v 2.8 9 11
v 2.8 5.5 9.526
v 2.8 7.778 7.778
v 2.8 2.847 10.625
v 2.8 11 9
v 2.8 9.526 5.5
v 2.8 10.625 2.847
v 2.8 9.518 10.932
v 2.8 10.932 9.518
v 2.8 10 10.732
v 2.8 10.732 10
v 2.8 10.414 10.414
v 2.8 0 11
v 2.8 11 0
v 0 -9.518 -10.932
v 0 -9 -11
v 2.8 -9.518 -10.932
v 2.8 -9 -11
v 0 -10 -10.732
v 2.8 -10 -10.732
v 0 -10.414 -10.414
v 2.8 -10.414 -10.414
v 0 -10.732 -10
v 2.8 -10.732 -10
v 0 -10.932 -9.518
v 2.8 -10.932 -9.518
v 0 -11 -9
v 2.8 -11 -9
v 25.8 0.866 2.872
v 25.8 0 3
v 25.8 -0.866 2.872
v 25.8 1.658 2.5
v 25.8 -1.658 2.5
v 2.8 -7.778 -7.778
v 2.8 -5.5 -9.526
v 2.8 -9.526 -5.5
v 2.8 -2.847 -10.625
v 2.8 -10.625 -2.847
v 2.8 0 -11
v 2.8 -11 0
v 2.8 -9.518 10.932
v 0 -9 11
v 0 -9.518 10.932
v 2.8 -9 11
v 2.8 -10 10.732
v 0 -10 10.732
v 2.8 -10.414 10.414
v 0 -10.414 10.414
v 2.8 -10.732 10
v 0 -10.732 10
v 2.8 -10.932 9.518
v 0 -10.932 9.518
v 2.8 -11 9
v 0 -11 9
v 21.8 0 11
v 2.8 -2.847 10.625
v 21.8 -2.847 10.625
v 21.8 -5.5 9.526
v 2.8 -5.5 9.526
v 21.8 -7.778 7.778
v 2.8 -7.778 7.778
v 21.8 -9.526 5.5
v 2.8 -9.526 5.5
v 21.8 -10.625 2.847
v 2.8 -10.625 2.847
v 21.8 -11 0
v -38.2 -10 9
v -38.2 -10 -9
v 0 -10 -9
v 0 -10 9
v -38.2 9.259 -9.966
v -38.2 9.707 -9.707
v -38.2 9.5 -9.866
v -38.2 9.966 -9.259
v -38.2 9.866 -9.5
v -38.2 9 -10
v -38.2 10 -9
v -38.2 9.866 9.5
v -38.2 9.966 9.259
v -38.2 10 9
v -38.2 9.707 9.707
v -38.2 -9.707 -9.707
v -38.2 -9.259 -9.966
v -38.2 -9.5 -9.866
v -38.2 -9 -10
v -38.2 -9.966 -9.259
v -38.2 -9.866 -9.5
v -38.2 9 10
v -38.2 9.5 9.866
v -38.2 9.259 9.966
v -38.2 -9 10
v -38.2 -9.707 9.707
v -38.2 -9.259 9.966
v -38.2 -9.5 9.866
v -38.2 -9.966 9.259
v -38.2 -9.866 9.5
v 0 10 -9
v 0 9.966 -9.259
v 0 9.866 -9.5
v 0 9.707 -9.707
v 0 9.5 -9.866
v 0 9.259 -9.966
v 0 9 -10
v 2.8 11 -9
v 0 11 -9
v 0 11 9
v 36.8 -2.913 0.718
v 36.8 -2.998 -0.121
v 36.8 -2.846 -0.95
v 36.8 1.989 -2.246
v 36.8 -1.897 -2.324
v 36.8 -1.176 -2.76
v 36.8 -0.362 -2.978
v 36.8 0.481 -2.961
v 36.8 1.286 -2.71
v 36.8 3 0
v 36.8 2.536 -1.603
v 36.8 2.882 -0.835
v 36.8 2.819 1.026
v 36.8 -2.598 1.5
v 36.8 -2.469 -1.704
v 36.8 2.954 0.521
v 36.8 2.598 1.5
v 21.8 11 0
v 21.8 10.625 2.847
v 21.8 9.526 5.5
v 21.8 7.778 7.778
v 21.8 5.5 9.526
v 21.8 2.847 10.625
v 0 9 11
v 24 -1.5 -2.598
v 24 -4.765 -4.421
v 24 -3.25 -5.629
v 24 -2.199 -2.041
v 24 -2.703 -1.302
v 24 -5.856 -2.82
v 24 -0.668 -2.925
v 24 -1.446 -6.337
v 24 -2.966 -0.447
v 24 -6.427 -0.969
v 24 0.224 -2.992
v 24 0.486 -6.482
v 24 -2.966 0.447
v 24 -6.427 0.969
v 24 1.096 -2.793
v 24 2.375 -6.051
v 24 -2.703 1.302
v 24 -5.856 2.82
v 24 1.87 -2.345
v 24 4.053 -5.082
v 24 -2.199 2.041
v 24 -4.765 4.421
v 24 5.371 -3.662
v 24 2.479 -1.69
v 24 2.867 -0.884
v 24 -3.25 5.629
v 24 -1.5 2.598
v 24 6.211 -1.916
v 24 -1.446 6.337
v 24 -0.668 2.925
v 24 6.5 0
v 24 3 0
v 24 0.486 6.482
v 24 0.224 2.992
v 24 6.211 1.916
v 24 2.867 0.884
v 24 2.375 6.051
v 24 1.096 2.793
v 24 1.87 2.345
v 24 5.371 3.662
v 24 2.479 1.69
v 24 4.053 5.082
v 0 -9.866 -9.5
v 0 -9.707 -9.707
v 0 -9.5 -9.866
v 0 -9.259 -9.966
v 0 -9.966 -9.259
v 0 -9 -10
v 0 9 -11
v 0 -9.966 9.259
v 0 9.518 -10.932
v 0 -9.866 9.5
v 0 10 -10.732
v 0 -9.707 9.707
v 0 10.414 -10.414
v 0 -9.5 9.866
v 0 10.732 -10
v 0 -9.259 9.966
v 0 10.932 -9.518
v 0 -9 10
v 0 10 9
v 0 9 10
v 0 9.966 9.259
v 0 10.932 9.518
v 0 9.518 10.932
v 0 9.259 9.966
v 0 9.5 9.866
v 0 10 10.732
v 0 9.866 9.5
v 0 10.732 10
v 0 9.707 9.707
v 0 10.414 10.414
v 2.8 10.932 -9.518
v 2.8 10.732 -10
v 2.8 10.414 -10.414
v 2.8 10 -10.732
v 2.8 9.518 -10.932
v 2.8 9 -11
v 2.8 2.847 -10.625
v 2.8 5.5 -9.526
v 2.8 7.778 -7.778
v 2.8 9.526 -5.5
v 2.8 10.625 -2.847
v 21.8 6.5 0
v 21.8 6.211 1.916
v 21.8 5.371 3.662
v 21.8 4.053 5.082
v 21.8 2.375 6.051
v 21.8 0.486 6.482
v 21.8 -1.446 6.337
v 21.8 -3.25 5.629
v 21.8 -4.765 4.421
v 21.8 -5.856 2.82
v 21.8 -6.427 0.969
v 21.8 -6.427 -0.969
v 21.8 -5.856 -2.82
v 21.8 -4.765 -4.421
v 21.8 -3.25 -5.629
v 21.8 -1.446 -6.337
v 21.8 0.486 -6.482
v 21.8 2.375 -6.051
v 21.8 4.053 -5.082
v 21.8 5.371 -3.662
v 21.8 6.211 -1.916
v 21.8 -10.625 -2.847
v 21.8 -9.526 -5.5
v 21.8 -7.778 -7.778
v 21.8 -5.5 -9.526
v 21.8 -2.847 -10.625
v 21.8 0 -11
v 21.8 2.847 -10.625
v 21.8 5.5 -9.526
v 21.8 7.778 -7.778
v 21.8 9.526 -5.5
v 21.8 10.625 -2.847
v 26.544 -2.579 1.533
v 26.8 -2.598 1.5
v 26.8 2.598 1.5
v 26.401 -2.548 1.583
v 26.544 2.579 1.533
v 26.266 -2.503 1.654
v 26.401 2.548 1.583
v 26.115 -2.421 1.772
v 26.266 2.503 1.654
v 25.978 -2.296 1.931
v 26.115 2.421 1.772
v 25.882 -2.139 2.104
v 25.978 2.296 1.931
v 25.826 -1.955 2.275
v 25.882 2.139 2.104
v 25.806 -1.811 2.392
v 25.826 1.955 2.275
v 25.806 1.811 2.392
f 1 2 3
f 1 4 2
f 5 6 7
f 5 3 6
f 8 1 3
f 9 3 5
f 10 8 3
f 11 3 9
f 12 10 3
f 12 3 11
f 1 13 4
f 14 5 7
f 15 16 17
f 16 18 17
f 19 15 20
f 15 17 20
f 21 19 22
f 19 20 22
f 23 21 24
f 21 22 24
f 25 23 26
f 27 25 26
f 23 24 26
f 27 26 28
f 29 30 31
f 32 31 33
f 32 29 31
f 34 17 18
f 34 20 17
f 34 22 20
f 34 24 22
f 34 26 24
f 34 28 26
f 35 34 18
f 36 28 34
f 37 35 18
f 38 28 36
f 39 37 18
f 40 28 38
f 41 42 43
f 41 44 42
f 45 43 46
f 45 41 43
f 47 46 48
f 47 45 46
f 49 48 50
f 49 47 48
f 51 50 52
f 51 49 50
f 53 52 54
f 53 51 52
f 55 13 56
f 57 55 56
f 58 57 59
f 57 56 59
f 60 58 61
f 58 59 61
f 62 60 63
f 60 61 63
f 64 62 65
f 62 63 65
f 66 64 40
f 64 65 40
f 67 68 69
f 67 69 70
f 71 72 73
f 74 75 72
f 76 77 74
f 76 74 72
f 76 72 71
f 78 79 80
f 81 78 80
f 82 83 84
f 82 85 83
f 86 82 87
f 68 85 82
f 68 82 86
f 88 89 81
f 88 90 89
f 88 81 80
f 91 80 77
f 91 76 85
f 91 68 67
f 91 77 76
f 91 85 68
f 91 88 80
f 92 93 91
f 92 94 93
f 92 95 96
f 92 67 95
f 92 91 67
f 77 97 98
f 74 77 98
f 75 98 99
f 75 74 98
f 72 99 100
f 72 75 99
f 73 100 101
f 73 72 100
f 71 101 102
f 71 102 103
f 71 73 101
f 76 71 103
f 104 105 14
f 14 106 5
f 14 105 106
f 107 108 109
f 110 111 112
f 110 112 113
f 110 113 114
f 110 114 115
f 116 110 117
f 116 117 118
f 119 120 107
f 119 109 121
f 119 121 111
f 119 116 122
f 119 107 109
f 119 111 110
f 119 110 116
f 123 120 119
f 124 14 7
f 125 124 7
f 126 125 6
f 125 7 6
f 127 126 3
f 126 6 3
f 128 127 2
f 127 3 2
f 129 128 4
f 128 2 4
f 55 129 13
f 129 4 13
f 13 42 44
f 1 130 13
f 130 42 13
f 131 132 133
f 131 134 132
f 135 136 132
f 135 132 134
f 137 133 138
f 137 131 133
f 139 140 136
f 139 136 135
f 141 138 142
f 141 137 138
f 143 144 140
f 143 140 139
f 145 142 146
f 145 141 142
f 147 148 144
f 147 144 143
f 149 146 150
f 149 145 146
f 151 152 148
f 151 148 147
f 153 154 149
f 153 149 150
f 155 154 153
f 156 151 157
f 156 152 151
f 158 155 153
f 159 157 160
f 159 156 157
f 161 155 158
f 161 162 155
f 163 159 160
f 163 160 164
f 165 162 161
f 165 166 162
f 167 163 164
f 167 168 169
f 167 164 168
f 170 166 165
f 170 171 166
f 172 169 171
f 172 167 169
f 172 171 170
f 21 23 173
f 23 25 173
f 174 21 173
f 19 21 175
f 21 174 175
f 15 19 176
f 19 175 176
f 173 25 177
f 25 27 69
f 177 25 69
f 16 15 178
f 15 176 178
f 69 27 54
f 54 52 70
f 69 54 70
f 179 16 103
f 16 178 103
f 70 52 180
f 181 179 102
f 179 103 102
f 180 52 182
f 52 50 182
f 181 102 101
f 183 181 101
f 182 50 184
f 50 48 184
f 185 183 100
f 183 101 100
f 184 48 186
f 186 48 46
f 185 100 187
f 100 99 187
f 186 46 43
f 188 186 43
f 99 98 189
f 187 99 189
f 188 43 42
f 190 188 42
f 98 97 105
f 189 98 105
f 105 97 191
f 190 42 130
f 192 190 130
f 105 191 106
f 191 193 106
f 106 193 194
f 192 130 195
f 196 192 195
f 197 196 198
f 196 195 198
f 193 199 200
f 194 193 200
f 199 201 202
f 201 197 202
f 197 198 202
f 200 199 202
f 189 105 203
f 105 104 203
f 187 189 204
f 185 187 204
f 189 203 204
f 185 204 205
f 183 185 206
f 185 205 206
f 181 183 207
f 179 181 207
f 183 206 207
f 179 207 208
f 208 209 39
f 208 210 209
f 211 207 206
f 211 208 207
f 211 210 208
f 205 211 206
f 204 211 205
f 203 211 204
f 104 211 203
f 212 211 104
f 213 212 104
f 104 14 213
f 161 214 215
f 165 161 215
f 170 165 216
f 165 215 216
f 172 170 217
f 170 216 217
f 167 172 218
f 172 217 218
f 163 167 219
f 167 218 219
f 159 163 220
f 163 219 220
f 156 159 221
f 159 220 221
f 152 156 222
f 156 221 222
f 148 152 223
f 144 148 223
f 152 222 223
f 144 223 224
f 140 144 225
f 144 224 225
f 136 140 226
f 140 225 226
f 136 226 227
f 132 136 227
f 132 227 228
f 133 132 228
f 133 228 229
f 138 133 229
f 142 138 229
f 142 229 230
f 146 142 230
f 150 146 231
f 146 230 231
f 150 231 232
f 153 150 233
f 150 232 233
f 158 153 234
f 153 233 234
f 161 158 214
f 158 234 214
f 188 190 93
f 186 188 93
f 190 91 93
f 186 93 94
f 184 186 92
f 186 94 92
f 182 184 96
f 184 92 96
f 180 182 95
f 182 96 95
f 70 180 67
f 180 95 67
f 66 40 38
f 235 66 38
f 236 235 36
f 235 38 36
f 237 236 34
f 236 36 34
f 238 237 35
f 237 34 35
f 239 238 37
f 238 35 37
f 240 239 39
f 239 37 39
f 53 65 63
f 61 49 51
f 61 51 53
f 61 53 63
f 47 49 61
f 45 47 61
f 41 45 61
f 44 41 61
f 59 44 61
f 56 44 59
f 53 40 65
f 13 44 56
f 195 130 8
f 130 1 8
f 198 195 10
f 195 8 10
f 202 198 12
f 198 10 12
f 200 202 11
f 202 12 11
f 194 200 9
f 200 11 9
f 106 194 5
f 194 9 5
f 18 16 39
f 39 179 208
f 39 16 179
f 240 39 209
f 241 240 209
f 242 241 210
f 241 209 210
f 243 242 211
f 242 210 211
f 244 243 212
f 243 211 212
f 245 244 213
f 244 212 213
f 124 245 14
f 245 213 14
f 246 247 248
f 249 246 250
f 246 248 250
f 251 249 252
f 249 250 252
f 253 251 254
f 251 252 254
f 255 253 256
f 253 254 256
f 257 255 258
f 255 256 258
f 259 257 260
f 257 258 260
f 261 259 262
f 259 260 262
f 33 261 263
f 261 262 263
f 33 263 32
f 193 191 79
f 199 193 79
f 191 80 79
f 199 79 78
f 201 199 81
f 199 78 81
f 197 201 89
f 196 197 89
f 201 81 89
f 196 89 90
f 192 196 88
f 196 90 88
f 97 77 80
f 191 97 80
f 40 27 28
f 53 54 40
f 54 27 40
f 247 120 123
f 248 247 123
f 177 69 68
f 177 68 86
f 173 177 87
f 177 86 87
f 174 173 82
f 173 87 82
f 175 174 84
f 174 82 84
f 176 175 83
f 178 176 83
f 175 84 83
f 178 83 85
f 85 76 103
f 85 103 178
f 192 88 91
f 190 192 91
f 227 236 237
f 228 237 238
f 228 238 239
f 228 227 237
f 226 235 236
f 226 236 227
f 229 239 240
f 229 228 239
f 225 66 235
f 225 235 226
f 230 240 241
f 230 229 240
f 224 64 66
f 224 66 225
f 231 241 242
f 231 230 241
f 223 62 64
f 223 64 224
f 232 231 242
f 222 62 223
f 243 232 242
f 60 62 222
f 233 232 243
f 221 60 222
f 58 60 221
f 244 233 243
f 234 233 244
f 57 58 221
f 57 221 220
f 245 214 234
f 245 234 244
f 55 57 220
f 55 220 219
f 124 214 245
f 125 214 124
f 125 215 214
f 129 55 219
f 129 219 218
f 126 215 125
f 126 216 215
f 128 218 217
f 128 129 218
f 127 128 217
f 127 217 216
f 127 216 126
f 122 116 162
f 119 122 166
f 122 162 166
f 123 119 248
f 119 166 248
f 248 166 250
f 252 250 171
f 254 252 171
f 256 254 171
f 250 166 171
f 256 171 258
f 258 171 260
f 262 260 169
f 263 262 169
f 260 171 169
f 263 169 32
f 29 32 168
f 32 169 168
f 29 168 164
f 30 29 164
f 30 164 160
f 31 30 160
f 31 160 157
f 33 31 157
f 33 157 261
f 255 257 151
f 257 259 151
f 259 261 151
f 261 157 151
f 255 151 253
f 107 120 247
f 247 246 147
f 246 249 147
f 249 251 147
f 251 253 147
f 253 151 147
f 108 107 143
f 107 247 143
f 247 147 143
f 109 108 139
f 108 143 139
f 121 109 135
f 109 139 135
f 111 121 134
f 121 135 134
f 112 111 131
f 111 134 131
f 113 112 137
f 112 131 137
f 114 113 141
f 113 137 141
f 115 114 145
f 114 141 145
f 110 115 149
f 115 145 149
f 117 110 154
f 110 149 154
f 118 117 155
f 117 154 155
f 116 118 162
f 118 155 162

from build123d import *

# Parameters (mm, degrees)
F0_W      = 2.8
F0_H      = 22
F1_DEPTH  = 11
F2_R      = 2
F4_DEPTH  = 19
F5_R      = 3
F6_DEPTH  = 15
F8_DEPTH  = 11
F9_R      = 1
F10_W     = 20
F10_H     = 20
F11_DEPTH = 38.2
F12_R     = 1
F5_R_2    = 6.5
F13_DEPTH = 2.2


with BuildPart() as f1:
    # F0 (on Top) → F1 (new body, symmetric)
    with BuildSketch(Plane.XY):
        with Locations((1.4, 0)):
            Rectangle(F0_W, F0_H)
    extrude(amount=F1_DEPTH, both=True)

    # F2
    f2_edges = [f1.edges().sort_by_distance(p)[0] for p in [
        (1.4, -11, 11),
        (1.4, 11, 11),
        (1.4, -11, -11),
        (1.4, 11, -11),
    ]]
    fillet(f2_edges, radius=F2_R)

    # F3 (on face) → F4 (join)
    with BuildSketch(Plane.YZ.offset(2.8)):
        with BuildLine():
            ThreePointArc((0, -11), (7.7781745931, -7.7781745931), (11, 0))
            ThreePointArc((11, 0), (7.7781745931, 7.7781745931), (0, 11))
            ThreePointArc((0, 11), (-7.7781745931, 7.7781745931), (-11, 0))
            ThreePointArc((-11, 0), (-7.7781745931, -7.7781745931), (0, -11))
        make_face()
    extrude(amount=F4_DEPTH)

    # F5 (on face) → F6 (join)
    with BuildSketch(Plane.YZ.offset(21.8)):
        Circle(F5_R)
    extrude(amount=F6_DEPTH)

    # F7 (on face) → F8 (cut)
    with BuildSketch(Plane.YZ.offset(36.8)):
        with BuildLine():
            ThreePointArc((2.5980762114, 1.5), (0, 3), (-2.5980762114, 1.5))
            Line((-2.5980762114, 1.5), (2.5980762114, 1.5))
        make_face()
    extrude(amount=-F8_DEPTH, mode=Mode.SUBTRACT)

    # F9
    f9_edges = [f1.edges().sort_by_distance(p)[0] for p in [
        (25.8, 0, 1.5),
    ]]
    fillet(f9_edges, radius=F9_R)

    # F10 (on face) → F11 (join)
    with BuildSketch(Plane(origin=(0, 0, 0), x_dir=(0, -1, 0), z_dir=(-1, 0, 0))):
        Rectangle(F10_W, F10_H)
    extrude(amount=F11_DEPTH)

    # F12
    f12_edges = [f1.edges().sort_by_distance(p)[0] for p in [
        (-19.1, -10, 10),
        (-19.1, 10, 10),
        (-19.1, -10, -10),
        (-19.1, 10, -10),
    ]]
    fillet(f12_edges, radius=F12_R)

    # F5 (on face) → F13 (join)
    with BuildSketch(Plane.YZ.offset(21.8)):
        Circle(F5_R_2)
        Circle(F5_R, mode=Mode.SUBTRACT)
    extrude(amount=F13_DEPTH)


solid = f1.part
